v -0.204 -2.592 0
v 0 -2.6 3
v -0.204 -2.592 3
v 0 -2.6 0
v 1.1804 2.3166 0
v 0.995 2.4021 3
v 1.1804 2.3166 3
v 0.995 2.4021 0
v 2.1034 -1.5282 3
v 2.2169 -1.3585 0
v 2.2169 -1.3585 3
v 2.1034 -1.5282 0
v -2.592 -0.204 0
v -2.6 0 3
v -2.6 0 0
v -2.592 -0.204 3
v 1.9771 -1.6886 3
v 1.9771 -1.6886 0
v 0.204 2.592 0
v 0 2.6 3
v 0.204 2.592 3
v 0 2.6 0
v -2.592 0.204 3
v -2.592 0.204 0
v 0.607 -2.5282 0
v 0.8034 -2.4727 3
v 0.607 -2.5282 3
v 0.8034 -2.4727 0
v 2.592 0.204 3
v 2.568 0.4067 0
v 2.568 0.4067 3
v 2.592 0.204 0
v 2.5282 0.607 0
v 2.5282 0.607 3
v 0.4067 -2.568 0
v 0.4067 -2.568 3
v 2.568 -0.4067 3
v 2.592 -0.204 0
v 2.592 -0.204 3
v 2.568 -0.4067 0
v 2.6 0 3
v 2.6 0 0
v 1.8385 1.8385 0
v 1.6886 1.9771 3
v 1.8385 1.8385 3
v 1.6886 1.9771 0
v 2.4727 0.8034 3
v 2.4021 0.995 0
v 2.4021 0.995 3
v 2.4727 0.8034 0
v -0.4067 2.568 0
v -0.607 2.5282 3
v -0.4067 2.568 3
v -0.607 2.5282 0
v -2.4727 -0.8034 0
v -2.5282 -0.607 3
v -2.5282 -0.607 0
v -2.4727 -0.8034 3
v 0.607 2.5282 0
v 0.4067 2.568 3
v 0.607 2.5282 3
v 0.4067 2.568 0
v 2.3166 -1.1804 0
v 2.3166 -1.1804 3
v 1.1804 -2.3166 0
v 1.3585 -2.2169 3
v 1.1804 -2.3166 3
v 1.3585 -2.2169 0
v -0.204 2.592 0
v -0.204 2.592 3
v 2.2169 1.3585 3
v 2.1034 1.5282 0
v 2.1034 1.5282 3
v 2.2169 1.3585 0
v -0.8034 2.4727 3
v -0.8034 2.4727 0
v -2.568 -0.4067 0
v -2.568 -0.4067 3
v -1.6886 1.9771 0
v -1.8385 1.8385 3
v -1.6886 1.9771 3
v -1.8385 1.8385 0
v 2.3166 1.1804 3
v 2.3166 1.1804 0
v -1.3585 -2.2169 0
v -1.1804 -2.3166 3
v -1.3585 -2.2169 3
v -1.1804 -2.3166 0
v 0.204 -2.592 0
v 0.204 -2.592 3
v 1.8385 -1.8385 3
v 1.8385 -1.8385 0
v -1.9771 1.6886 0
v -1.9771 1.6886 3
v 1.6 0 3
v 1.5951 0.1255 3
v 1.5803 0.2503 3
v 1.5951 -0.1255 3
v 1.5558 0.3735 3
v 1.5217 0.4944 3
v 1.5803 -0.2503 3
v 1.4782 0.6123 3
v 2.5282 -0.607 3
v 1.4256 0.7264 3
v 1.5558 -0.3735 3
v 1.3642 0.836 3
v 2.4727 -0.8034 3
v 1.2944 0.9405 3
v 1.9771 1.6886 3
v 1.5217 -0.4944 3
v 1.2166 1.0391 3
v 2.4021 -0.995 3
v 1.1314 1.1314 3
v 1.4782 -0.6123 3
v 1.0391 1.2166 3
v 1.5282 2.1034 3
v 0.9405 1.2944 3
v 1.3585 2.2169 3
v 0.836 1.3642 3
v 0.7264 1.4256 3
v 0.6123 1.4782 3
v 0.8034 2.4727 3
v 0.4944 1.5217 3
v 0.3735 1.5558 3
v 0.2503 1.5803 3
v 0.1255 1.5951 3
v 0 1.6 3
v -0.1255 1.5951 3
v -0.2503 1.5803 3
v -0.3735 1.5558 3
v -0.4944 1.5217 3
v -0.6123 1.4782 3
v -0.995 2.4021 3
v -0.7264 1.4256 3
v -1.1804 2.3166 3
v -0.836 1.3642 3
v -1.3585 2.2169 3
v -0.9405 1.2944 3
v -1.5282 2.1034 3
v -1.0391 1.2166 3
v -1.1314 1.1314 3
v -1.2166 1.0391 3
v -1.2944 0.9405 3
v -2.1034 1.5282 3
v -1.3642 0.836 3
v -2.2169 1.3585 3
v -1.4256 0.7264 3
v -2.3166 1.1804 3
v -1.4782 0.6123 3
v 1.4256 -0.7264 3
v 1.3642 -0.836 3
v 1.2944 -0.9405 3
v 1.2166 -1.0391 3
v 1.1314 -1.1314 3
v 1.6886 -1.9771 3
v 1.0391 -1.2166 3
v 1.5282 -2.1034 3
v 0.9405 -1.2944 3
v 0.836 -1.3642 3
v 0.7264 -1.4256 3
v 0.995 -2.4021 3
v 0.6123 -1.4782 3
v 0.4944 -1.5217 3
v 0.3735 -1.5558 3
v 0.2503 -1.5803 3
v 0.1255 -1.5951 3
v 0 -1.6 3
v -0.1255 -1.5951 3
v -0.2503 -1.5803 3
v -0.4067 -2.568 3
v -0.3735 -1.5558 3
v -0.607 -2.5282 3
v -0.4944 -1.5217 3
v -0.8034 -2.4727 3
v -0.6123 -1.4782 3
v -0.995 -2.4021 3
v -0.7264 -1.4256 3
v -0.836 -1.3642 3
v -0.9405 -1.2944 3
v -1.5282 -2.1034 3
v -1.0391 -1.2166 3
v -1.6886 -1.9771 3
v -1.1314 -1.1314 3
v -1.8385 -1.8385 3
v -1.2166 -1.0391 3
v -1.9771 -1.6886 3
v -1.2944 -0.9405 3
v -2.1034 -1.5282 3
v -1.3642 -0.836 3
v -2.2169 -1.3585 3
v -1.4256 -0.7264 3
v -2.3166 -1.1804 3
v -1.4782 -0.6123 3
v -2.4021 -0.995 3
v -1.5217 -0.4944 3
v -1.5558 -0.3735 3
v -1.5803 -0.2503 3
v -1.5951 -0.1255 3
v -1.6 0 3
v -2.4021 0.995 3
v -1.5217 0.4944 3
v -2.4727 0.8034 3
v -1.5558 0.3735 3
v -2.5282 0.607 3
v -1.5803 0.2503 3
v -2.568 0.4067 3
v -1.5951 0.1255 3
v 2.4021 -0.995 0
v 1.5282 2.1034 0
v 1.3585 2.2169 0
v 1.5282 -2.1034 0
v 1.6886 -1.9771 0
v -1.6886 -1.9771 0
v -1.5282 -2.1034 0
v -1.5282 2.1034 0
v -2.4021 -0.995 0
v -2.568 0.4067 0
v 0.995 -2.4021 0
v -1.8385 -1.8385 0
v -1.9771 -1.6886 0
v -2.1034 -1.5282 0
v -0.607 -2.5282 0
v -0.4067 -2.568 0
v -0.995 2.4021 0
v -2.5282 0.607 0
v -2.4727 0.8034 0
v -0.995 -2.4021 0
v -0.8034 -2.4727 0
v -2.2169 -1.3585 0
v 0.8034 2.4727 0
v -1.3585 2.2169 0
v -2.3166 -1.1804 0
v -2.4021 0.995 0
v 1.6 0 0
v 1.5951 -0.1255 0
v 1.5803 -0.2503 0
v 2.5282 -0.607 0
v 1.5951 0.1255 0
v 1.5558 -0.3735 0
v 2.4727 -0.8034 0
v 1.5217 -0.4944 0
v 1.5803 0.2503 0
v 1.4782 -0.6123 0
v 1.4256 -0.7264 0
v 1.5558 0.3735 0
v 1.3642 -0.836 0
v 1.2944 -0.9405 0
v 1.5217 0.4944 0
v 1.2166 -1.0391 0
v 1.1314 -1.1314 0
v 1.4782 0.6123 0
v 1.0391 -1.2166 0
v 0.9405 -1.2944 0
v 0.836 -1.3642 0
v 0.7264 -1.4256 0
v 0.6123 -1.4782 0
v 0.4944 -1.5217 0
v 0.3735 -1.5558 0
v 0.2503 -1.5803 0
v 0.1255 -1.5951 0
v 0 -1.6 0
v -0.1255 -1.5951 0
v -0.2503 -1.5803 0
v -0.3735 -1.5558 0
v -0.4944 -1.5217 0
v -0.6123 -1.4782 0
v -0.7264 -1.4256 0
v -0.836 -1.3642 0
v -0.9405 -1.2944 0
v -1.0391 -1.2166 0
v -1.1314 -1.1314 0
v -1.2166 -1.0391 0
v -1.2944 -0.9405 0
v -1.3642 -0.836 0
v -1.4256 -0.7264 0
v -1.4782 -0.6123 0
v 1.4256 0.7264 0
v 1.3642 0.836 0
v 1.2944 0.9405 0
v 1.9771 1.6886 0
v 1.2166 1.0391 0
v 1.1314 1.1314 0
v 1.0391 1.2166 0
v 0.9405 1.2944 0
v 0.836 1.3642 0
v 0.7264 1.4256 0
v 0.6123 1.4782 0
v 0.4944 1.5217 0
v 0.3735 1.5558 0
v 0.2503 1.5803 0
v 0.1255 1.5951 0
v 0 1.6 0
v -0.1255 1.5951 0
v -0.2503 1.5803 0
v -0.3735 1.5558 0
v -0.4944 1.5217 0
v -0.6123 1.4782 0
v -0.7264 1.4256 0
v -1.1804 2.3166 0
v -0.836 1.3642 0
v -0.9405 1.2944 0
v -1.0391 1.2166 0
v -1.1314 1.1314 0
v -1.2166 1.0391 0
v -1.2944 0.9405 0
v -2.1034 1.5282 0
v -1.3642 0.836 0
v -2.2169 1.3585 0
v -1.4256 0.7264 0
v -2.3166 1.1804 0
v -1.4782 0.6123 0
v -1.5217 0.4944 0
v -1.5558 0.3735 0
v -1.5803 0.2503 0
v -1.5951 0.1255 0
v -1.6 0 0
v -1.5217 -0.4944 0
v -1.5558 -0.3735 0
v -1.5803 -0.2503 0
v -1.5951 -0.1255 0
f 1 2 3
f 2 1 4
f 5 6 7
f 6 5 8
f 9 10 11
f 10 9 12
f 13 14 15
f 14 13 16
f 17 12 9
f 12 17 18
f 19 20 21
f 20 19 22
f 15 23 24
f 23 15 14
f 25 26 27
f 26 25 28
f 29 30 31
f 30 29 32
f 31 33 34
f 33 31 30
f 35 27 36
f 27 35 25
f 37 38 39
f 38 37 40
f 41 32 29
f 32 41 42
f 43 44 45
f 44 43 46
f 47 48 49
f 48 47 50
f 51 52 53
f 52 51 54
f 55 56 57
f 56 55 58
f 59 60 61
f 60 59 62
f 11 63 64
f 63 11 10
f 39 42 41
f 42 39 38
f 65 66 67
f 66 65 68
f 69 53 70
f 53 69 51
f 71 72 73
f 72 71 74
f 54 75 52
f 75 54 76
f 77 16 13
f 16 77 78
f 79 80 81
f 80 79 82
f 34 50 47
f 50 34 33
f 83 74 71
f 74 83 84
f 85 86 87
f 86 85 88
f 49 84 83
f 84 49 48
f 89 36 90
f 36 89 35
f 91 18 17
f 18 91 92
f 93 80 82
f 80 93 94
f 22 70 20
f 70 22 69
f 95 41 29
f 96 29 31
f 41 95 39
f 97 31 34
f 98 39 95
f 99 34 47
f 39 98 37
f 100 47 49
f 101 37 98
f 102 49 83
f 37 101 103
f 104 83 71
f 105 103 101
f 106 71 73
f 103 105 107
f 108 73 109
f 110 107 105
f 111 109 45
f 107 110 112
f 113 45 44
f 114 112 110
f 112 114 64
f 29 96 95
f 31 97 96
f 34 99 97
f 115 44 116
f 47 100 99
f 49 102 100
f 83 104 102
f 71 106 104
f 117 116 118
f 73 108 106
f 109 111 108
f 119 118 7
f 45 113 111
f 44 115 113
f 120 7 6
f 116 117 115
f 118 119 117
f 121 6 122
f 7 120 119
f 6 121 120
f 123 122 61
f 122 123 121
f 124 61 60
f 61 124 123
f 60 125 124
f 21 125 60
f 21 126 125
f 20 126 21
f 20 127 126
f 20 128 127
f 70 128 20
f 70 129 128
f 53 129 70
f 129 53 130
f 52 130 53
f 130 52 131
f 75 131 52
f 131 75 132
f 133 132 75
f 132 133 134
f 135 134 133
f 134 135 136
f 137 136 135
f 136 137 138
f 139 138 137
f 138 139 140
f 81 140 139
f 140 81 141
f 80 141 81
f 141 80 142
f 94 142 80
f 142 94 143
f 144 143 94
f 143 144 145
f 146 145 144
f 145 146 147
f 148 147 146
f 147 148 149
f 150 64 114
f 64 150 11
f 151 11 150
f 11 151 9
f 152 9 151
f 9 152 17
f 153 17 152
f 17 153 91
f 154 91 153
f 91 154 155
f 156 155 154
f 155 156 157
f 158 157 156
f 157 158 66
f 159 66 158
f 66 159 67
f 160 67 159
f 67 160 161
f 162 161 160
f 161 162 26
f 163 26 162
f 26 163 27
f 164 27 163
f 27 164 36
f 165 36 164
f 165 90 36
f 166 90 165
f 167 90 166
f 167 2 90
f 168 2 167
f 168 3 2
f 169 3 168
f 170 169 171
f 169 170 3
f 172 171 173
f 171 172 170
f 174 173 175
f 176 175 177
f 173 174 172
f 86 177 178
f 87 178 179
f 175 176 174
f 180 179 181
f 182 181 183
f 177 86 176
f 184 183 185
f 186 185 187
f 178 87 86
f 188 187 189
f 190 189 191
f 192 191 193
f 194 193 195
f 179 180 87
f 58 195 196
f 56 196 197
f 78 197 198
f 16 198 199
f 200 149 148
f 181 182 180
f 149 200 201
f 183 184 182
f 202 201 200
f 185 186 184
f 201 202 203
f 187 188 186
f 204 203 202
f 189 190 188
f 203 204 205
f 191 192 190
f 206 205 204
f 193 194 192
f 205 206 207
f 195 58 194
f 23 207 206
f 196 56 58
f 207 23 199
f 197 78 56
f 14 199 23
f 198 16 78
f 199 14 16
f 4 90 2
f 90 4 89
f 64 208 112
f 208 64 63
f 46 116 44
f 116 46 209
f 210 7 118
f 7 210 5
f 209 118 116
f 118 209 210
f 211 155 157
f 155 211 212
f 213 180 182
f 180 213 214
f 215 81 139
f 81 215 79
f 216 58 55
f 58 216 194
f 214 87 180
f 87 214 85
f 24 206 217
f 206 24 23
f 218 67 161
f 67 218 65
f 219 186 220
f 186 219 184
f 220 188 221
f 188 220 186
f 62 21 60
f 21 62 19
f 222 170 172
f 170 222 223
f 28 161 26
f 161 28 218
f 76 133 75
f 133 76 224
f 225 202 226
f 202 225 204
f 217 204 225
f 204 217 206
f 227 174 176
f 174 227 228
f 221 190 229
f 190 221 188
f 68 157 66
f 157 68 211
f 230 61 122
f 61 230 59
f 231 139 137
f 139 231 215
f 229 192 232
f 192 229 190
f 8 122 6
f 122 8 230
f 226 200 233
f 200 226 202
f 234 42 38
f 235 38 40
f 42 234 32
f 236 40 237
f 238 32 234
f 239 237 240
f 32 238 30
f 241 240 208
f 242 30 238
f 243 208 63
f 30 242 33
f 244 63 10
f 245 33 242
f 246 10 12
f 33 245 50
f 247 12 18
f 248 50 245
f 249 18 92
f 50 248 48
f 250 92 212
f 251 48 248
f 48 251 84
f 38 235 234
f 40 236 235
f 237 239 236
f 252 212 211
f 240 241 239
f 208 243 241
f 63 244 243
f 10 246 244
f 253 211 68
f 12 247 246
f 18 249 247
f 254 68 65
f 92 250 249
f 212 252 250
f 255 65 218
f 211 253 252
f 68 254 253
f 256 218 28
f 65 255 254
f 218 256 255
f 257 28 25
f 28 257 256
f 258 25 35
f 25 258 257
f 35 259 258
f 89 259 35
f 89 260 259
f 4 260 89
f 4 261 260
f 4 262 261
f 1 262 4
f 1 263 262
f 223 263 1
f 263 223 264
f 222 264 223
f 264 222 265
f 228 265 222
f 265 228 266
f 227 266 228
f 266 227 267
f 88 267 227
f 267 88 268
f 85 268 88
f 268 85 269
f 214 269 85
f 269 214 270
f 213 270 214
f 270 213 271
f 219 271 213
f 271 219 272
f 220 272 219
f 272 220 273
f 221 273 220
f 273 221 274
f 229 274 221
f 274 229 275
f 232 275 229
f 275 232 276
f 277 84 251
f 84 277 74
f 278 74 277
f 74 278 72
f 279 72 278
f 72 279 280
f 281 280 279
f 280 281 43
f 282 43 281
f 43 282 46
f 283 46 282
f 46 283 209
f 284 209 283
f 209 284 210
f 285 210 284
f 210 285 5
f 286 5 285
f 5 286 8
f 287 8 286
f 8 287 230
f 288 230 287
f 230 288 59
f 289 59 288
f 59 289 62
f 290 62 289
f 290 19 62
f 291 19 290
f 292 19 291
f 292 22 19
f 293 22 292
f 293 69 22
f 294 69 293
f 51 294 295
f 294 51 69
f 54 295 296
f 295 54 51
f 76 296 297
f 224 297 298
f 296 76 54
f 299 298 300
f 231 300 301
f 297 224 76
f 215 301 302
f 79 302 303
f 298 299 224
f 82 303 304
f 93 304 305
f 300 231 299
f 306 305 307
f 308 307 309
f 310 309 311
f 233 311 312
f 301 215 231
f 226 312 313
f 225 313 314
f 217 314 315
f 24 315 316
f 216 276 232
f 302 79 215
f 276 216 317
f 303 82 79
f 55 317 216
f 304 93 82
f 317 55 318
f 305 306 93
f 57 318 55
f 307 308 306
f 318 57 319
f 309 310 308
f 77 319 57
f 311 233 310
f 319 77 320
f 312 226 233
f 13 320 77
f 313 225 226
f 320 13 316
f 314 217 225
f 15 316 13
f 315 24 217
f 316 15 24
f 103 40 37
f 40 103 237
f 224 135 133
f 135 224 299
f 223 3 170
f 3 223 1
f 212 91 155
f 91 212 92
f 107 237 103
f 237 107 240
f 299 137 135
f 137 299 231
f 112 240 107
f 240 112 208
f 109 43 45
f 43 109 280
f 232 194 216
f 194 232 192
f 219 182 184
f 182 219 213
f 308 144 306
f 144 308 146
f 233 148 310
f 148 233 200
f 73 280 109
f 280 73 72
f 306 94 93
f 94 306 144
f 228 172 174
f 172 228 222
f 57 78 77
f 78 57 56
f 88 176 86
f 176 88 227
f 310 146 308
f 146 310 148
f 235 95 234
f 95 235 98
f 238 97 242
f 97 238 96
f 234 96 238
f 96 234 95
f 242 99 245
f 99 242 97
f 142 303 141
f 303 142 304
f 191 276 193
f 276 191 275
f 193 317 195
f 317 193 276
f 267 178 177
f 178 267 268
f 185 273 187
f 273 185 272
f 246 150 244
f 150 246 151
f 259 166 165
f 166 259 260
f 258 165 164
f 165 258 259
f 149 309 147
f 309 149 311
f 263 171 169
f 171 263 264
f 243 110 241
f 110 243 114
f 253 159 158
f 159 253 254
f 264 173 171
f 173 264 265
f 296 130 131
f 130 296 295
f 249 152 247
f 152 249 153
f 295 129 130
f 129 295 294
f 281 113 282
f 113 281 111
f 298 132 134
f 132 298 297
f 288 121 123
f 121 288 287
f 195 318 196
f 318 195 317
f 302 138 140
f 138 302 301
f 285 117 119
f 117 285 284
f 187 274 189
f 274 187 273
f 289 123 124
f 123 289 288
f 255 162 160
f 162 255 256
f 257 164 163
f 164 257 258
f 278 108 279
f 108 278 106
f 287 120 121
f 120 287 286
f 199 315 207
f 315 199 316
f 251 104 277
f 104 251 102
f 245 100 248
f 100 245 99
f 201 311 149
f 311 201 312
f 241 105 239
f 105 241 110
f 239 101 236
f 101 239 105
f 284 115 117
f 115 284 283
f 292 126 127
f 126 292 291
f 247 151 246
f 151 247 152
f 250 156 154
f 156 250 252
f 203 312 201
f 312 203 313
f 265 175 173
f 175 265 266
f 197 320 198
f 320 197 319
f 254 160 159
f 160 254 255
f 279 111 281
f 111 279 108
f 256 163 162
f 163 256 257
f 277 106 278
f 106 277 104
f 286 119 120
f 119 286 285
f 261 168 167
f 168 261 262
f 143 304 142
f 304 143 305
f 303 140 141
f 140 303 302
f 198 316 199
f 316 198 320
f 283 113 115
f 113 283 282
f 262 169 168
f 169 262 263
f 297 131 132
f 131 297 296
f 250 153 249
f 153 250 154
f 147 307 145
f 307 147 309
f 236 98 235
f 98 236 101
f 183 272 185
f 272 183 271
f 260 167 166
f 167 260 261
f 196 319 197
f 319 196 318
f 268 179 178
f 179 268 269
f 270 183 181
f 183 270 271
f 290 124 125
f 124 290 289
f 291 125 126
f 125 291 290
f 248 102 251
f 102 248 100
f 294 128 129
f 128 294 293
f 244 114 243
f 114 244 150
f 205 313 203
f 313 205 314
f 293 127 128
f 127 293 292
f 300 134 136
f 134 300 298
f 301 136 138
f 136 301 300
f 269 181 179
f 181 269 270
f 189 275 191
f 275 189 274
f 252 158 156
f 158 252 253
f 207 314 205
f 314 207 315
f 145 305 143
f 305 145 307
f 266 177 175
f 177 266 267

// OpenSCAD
module simpleStandoff(height) {
  mountingHoleDiameter = 3.2;
  difference() {
    cylinder(r=1 + mountingHoleDiameter/2, h = height);
    translate([0,0,-1]) cylinder(r=mountingHoleDiameter/2, h = height+2);    
  }
}


simpleStandoff(3, $fn=80);
